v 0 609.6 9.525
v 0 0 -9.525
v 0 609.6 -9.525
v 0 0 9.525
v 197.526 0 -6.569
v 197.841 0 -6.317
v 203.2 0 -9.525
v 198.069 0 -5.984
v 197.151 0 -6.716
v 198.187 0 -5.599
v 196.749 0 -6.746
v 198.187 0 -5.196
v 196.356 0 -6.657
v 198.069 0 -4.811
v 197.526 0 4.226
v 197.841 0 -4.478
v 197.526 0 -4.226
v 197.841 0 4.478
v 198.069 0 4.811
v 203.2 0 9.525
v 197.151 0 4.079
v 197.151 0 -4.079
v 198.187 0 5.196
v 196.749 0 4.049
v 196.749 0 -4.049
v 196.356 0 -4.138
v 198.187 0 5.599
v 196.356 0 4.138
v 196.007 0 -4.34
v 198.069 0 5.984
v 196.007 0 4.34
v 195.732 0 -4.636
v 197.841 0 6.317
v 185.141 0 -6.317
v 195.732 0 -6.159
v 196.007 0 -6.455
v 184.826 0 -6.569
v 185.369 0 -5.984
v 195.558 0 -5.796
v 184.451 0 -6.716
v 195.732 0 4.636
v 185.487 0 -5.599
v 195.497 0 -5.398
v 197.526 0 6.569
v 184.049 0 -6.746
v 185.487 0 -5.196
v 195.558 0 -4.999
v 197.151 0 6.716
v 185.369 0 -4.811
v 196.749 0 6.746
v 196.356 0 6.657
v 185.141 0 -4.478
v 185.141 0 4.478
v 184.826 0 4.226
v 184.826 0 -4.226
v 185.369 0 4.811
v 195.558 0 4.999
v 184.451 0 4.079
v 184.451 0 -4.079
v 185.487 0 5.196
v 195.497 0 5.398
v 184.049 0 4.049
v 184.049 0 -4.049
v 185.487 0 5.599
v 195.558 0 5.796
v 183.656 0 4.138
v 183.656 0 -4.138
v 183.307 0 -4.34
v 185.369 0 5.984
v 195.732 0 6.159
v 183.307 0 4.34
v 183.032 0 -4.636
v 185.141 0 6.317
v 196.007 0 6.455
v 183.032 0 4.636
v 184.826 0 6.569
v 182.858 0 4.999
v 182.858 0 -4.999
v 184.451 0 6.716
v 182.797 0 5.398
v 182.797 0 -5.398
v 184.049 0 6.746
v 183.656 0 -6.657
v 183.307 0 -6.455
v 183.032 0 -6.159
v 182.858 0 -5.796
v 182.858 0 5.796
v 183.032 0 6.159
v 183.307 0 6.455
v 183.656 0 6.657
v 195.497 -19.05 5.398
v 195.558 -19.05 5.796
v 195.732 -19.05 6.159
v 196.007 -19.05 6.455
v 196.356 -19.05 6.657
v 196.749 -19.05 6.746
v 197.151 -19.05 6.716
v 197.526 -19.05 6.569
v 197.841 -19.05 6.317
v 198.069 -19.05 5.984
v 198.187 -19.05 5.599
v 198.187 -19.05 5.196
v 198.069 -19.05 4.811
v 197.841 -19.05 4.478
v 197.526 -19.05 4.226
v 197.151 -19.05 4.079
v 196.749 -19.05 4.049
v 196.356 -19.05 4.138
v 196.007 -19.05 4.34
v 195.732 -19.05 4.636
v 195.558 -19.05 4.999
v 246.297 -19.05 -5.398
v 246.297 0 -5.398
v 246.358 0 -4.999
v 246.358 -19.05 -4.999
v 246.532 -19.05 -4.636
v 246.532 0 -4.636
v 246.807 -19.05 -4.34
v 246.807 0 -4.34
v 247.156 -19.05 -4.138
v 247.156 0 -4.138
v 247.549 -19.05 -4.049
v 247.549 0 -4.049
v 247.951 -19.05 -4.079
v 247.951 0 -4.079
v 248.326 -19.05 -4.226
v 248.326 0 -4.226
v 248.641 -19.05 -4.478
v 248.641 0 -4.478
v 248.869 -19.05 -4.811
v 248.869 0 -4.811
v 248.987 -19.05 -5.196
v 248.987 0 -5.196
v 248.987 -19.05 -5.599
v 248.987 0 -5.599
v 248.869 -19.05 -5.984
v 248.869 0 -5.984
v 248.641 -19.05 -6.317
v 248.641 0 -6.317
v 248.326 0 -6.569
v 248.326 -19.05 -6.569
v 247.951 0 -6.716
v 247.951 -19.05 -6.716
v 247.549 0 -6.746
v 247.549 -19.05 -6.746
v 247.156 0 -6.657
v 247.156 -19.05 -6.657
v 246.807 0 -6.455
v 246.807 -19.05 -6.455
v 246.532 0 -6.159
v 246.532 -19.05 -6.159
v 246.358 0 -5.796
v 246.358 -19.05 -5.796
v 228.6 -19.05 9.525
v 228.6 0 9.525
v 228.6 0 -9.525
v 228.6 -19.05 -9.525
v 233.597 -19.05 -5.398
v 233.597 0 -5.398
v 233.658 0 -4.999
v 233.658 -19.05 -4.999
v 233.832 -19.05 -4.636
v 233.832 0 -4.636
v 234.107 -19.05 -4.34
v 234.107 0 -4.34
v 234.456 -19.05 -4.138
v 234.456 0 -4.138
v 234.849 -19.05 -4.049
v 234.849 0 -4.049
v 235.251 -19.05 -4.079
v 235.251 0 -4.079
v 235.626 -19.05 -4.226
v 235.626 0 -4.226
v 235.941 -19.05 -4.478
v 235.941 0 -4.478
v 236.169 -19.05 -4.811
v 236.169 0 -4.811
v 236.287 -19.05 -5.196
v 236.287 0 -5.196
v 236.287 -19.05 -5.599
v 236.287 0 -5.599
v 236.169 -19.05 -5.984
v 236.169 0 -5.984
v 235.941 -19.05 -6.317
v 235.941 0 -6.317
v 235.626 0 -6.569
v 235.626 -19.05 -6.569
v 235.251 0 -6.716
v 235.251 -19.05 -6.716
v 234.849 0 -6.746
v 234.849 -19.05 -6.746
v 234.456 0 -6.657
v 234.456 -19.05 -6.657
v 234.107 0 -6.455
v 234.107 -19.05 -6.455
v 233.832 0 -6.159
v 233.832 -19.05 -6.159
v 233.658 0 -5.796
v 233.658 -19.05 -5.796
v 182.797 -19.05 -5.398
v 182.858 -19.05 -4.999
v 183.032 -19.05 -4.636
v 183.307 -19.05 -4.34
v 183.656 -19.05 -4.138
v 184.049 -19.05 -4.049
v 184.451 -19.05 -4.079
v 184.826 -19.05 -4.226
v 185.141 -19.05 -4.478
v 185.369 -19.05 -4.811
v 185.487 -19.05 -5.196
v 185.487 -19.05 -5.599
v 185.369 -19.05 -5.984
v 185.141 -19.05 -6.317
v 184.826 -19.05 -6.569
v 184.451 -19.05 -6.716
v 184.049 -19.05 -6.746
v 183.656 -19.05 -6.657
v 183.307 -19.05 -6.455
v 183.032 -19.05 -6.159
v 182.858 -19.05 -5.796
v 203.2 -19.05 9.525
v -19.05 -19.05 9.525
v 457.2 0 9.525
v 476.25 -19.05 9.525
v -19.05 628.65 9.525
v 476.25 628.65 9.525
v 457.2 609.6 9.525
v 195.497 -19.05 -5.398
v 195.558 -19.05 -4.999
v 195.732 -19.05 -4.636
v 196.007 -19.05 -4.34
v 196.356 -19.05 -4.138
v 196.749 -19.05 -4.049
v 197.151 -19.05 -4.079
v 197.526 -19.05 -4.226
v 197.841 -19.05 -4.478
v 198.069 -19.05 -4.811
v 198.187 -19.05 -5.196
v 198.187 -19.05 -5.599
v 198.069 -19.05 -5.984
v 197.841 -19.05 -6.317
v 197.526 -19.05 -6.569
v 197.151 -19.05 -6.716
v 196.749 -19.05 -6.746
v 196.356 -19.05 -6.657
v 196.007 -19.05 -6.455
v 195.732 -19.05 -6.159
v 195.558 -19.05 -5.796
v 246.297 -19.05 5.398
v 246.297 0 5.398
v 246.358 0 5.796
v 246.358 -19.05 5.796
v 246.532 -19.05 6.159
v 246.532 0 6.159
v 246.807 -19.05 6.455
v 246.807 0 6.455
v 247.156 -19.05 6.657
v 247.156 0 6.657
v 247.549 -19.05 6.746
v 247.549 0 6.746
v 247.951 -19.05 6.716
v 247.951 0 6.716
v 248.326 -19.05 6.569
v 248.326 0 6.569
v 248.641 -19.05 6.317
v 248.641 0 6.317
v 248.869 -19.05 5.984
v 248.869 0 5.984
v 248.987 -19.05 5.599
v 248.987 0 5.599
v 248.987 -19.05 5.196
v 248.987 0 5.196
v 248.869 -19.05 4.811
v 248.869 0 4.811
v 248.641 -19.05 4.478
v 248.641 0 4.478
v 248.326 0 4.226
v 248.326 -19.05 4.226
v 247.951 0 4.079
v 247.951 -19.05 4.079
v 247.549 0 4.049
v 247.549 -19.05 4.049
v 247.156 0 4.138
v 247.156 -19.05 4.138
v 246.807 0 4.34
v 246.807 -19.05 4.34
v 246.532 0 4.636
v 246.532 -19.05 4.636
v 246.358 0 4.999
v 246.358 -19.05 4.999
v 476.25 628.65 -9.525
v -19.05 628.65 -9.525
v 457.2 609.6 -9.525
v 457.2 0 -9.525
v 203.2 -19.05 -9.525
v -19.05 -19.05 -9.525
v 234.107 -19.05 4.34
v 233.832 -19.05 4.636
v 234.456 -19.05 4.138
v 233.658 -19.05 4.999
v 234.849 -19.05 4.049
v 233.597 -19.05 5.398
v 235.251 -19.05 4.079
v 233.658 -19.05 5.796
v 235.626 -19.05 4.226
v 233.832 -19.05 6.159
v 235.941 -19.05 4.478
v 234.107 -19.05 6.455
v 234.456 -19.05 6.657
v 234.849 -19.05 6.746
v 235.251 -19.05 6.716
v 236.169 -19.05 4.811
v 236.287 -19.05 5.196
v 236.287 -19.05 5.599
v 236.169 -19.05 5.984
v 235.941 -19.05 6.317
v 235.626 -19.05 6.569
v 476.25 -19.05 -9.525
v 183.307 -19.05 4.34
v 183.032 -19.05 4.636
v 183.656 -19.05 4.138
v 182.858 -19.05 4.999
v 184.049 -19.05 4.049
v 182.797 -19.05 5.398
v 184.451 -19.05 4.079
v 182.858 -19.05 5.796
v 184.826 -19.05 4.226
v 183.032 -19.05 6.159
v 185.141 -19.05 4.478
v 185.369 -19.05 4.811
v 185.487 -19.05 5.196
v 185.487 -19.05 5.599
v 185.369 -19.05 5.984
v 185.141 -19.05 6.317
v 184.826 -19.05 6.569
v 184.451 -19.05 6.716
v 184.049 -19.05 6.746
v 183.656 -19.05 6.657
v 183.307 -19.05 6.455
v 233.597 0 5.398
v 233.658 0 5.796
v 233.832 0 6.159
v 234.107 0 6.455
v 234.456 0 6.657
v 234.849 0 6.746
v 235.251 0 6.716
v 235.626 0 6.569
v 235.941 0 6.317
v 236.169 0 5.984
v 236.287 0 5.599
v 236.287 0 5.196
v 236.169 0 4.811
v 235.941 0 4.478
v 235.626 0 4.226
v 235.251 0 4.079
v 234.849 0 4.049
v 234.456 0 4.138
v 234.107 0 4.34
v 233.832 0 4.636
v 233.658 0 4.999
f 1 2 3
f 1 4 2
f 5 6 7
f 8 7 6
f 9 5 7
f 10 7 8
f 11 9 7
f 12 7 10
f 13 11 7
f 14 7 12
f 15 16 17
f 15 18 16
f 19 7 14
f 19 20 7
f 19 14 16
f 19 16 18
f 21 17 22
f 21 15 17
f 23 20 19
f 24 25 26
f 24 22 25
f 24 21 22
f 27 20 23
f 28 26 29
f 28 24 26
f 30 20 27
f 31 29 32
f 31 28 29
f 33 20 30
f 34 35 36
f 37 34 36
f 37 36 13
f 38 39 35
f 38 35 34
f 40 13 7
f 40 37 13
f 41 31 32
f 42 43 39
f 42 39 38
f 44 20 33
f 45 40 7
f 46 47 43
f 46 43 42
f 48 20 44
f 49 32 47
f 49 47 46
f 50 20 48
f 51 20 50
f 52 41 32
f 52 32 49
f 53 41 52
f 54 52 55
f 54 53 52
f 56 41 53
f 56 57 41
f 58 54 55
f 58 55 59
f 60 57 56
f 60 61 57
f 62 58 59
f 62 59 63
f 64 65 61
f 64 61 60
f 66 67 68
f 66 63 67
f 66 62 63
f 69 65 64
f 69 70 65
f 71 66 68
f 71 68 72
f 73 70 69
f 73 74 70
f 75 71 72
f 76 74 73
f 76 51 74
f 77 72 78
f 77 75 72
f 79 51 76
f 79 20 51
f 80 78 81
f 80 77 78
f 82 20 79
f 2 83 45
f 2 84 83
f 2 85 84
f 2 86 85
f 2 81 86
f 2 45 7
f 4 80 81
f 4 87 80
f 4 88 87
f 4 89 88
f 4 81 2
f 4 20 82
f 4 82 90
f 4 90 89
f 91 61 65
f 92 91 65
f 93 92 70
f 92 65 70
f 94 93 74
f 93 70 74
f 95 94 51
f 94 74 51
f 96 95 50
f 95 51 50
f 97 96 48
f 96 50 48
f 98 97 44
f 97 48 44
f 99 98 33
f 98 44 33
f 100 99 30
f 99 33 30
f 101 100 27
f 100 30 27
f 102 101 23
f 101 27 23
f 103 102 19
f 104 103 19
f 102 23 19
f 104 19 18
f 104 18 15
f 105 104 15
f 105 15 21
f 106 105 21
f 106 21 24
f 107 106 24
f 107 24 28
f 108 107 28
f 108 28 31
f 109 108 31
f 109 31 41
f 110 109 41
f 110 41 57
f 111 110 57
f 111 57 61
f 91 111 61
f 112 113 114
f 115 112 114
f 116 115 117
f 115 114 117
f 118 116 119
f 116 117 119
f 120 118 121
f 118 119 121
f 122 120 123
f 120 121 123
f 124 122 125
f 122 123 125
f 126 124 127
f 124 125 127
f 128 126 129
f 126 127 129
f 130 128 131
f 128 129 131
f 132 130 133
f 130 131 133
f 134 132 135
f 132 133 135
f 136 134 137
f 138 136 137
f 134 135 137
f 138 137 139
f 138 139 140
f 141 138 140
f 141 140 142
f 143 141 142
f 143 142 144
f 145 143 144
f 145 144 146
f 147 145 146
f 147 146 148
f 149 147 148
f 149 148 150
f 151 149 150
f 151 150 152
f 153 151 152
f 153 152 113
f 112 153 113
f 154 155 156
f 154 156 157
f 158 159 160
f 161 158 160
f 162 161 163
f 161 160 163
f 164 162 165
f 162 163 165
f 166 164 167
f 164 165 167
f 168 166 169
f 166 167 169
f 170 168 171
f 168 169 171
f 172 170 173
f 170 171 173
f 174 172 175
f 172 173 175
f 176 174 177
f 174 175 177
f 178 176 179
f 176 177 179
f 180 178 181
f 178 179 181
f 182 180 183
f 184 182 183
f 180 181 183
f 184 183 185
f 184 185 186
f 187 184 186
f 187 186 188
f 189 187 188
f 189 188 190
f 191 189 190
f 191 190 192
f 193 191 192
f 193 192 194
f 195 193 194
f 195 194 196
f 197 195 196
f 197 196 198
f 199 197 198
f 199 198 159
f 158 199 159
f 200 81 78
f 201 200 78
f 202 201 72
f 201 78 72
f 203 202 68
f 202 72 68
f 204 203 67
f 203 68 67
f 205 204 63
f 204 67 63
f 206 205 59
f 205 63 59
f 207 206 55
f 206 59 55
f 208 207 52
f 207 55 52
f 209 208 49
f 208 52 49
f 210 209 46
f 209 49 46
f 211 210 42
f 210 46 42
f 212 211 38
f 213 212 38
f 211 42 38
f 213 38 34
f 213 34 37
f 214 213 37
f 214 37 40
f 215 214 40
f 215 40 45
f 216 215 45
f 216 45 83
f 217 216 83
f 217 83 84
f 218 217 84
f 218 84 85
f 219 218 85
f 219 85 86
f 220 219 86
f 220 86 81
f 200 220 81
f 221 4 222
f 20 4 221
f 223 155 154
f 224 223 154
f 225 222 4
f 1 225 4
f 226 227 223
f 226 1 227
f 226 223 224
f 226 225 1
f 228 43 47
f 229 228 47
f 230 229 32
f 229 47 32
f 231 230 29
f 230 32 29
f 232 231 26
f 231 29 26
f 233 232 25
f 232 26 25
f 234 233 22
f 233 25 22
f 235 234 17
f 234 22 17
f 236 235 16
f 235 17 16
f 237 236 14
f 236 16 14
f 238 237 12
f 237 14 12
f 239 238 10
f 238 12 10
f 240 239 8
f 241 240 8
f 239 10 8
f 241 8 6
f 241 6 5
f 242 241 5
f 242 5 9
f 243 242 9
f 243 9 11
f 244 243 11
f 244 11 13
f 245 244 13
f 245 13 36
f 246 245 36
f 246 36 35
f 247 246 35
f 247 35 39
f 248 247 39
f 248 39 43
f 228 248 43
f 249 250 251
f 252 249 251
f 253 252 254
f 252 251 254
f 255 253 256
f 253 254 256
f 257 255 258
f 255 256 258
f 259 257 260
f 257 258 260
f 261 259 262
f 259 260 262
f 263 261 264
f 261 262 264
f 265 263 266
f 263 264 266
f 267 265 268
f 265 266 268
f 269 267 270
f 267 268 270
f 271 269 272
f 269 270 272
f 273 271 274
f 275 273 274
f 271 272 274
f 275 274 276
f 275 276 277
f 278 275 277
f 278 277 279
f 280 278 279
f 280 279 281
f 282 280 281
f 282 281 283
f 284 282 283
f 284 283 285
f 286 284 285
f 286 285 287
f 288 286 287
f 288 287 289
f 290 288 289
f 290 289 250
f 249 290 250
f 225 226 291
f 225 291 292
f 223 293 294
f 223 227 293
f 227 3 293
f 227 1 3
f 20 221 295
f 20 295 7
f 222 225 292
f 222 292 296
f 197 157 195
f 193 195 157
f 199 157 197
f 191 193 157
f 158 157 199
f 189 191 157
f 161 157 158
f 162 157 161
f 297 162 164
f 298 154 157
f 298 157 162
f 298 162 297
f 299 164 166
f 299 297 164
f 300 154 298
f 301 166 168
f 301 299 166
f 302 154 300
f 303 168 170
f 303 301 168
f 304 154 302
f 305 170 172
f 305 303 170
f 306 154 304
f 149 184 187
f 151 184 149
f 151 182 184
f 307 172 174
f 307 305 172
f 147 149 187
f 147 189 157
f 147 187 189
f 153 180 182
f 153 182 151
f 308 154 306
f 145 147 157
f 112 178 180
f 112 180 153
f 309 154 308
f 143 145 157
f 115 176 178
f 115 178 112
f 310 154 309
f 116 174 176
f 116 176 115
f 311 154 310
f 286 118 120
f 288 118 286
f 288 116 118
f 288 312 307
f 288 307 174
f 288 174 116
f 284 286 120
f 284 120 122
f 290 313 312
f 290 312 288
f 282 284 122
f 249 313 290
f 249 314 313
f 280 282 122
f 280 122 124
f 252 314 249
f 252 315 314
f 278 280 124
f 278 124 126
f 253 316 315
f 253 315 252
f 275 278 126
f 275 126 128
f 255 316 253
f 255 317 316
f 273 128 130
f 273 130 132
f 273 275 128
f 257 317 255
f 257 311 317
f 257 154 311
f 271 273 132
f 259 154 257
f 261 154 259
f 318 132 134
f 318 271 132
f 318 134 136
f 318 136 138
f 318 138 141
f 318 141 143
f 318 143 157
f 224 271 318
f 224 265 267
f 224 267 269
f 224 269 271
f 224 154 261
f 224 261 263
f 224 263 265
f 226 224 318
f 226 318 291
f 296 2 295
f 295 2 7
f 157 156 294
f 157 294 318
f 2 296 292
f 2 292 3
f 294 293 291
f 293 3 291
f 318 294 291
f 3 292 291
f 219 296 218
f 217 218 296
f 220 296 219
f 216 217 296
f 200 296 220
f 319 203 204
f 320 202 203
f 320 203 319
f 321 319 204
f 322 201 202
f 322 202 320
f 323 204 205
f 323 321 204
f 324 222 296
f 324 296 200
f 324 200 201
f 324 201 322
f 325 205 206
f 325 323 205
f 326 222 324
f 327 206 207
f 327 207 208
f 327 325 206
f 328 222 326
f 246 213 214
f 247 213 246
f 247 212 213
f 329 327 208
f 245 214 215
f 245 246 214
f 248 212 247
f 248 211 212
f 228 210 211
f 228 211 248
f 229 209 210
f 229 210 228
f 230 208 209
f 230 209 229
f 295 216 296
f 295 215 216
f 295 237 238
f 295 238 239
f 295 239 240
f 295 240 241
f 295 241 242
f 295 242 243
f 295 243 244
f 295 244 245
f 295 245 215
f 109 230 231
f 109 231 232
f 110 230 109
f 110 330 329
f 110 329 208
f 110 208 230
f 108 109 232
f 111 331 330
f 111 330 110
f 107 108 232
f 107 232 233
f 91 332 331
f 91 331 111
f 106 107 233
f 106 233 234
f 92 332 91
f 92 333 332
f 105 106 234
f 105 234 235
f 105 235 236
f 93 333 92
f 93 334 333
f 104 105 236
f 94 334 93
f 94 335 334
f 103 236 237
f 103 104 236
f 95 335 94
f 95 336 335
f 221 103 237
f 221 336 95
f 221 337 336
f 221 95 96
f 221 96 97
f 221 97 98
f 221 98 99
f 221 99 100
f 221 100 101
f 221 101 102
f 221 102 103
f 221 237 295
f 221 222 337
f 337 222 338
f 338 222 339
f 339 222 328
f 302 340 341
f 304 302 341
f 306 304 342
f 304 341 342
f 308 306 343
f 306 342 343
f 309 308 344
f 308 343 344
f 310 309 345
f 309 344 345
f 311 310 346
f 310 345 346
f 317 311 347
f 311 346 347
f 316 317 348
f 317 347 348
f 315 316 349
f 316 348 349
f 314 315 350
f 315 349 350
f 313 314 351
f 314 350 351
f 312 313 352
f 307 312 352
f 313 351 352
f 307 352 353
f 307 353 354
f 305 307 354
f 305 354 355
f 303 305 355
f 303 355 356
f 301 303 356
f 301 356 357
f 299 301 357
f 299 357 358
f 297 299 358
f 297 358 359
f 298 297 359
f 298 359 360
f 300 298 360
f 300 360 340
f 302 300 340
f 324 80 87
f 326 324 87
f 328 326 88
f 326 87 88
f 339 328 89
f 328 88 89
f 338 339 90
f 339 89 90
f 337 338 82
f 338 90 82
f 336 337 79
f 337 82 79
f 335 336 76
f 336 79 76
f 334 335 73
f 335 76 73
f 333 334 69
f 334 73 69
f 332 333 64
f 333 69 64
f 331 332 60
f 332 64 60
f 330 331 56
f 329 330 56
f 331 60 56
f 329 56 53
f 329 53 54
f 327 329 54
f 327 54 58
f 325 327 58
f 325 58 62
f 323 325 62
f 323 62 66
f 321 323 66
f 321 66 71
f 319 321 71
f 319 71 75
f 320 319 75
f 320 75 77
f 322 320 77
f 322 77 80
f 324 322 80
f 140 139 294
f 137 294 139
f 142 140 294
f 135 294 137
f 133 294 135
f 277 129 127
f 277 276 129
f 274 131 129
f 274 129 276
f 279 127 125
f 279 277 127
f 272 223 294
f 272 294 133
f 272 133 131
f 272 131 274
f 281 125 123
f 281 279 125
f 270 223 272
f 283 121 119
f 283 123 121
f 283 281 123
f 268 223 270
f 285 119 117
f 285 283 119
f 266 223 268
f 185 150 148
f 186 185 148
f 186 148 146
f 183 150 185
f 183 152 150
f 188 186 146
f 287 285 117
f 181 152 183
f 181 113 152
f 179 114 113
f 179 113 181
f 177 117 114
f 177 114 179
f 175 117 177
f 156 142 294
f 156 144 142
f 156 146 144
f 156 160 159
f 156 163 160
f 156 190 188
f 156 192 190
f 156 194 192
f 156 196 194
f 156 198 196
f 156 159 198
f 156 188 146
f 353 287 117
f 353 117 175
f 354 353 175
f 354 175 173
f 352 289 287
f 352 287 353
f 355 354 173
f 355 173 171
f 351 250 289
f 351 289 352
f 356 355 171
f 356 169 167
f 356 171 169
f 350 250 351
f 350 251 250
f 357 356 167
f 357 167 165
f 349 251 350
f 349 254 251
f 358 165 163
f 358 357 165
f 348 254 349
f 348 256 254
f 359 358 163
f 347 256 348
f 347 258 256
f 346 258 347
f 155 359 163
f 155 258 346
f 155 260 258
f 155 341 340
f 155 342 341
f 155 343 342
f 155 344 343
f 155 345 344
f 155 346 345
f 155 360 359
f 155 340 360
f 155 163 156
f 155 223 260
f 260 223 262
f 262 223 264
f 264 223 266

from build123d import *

# Parameters (mm, degrees)
F1_DEPTH = 9.525
F2_R     = 1.35255
F3_DEPTH = 19.051


with BuildPart() as f1:
    # F0 (on Top) → F1 (new body, symmetric)
    with BuildSketch(Plane.XY):
        Polygon((457.2, 609.6), (457.2, 0), (228.6, 0), (228.6, -19.05), (476.25, -19.05), (476.25, 628.65), (-19.05, 628.65), (-19.05, -19.05), (203.2, -19.05), (203.2, 0), (0, 0), (0, 609.6), align=None)
    extrude(amount=F1_DEPTH, both=True)

    # F2 (on face) → F3 (cut, through all)
    with BuildSketch(Plane(origin=(0, 0, 0), x_dir=(-1, 0, 0), z_dir=(0, 1, 0))):
        with Locations((-247.65, 5.3975)):
            Circle(F2_R)
        with Locations((-247.65, -5.3975)):
            Circle(F2_R)
        with Locations((-234.95, 5.3975)):
            Circle(F2_R)
        with Locations((-234.95, -5.3975)):
            Circle(F2_R)
        with Locations((-196.85, 5.3975)):
            Circle(F2_R)
        with Locations((-184.15, 5.3975)):
            Circle(F2_R)
        with Locations((-184.15, -5.3975)):
            Circle(F2_R)
        with Locations((-196.85, -5.3975)):
            Circle(F2_R)
    extrude(amount=-F3_DEPTH, mode=Mode.SUBTRACT)


solid = f1.part
